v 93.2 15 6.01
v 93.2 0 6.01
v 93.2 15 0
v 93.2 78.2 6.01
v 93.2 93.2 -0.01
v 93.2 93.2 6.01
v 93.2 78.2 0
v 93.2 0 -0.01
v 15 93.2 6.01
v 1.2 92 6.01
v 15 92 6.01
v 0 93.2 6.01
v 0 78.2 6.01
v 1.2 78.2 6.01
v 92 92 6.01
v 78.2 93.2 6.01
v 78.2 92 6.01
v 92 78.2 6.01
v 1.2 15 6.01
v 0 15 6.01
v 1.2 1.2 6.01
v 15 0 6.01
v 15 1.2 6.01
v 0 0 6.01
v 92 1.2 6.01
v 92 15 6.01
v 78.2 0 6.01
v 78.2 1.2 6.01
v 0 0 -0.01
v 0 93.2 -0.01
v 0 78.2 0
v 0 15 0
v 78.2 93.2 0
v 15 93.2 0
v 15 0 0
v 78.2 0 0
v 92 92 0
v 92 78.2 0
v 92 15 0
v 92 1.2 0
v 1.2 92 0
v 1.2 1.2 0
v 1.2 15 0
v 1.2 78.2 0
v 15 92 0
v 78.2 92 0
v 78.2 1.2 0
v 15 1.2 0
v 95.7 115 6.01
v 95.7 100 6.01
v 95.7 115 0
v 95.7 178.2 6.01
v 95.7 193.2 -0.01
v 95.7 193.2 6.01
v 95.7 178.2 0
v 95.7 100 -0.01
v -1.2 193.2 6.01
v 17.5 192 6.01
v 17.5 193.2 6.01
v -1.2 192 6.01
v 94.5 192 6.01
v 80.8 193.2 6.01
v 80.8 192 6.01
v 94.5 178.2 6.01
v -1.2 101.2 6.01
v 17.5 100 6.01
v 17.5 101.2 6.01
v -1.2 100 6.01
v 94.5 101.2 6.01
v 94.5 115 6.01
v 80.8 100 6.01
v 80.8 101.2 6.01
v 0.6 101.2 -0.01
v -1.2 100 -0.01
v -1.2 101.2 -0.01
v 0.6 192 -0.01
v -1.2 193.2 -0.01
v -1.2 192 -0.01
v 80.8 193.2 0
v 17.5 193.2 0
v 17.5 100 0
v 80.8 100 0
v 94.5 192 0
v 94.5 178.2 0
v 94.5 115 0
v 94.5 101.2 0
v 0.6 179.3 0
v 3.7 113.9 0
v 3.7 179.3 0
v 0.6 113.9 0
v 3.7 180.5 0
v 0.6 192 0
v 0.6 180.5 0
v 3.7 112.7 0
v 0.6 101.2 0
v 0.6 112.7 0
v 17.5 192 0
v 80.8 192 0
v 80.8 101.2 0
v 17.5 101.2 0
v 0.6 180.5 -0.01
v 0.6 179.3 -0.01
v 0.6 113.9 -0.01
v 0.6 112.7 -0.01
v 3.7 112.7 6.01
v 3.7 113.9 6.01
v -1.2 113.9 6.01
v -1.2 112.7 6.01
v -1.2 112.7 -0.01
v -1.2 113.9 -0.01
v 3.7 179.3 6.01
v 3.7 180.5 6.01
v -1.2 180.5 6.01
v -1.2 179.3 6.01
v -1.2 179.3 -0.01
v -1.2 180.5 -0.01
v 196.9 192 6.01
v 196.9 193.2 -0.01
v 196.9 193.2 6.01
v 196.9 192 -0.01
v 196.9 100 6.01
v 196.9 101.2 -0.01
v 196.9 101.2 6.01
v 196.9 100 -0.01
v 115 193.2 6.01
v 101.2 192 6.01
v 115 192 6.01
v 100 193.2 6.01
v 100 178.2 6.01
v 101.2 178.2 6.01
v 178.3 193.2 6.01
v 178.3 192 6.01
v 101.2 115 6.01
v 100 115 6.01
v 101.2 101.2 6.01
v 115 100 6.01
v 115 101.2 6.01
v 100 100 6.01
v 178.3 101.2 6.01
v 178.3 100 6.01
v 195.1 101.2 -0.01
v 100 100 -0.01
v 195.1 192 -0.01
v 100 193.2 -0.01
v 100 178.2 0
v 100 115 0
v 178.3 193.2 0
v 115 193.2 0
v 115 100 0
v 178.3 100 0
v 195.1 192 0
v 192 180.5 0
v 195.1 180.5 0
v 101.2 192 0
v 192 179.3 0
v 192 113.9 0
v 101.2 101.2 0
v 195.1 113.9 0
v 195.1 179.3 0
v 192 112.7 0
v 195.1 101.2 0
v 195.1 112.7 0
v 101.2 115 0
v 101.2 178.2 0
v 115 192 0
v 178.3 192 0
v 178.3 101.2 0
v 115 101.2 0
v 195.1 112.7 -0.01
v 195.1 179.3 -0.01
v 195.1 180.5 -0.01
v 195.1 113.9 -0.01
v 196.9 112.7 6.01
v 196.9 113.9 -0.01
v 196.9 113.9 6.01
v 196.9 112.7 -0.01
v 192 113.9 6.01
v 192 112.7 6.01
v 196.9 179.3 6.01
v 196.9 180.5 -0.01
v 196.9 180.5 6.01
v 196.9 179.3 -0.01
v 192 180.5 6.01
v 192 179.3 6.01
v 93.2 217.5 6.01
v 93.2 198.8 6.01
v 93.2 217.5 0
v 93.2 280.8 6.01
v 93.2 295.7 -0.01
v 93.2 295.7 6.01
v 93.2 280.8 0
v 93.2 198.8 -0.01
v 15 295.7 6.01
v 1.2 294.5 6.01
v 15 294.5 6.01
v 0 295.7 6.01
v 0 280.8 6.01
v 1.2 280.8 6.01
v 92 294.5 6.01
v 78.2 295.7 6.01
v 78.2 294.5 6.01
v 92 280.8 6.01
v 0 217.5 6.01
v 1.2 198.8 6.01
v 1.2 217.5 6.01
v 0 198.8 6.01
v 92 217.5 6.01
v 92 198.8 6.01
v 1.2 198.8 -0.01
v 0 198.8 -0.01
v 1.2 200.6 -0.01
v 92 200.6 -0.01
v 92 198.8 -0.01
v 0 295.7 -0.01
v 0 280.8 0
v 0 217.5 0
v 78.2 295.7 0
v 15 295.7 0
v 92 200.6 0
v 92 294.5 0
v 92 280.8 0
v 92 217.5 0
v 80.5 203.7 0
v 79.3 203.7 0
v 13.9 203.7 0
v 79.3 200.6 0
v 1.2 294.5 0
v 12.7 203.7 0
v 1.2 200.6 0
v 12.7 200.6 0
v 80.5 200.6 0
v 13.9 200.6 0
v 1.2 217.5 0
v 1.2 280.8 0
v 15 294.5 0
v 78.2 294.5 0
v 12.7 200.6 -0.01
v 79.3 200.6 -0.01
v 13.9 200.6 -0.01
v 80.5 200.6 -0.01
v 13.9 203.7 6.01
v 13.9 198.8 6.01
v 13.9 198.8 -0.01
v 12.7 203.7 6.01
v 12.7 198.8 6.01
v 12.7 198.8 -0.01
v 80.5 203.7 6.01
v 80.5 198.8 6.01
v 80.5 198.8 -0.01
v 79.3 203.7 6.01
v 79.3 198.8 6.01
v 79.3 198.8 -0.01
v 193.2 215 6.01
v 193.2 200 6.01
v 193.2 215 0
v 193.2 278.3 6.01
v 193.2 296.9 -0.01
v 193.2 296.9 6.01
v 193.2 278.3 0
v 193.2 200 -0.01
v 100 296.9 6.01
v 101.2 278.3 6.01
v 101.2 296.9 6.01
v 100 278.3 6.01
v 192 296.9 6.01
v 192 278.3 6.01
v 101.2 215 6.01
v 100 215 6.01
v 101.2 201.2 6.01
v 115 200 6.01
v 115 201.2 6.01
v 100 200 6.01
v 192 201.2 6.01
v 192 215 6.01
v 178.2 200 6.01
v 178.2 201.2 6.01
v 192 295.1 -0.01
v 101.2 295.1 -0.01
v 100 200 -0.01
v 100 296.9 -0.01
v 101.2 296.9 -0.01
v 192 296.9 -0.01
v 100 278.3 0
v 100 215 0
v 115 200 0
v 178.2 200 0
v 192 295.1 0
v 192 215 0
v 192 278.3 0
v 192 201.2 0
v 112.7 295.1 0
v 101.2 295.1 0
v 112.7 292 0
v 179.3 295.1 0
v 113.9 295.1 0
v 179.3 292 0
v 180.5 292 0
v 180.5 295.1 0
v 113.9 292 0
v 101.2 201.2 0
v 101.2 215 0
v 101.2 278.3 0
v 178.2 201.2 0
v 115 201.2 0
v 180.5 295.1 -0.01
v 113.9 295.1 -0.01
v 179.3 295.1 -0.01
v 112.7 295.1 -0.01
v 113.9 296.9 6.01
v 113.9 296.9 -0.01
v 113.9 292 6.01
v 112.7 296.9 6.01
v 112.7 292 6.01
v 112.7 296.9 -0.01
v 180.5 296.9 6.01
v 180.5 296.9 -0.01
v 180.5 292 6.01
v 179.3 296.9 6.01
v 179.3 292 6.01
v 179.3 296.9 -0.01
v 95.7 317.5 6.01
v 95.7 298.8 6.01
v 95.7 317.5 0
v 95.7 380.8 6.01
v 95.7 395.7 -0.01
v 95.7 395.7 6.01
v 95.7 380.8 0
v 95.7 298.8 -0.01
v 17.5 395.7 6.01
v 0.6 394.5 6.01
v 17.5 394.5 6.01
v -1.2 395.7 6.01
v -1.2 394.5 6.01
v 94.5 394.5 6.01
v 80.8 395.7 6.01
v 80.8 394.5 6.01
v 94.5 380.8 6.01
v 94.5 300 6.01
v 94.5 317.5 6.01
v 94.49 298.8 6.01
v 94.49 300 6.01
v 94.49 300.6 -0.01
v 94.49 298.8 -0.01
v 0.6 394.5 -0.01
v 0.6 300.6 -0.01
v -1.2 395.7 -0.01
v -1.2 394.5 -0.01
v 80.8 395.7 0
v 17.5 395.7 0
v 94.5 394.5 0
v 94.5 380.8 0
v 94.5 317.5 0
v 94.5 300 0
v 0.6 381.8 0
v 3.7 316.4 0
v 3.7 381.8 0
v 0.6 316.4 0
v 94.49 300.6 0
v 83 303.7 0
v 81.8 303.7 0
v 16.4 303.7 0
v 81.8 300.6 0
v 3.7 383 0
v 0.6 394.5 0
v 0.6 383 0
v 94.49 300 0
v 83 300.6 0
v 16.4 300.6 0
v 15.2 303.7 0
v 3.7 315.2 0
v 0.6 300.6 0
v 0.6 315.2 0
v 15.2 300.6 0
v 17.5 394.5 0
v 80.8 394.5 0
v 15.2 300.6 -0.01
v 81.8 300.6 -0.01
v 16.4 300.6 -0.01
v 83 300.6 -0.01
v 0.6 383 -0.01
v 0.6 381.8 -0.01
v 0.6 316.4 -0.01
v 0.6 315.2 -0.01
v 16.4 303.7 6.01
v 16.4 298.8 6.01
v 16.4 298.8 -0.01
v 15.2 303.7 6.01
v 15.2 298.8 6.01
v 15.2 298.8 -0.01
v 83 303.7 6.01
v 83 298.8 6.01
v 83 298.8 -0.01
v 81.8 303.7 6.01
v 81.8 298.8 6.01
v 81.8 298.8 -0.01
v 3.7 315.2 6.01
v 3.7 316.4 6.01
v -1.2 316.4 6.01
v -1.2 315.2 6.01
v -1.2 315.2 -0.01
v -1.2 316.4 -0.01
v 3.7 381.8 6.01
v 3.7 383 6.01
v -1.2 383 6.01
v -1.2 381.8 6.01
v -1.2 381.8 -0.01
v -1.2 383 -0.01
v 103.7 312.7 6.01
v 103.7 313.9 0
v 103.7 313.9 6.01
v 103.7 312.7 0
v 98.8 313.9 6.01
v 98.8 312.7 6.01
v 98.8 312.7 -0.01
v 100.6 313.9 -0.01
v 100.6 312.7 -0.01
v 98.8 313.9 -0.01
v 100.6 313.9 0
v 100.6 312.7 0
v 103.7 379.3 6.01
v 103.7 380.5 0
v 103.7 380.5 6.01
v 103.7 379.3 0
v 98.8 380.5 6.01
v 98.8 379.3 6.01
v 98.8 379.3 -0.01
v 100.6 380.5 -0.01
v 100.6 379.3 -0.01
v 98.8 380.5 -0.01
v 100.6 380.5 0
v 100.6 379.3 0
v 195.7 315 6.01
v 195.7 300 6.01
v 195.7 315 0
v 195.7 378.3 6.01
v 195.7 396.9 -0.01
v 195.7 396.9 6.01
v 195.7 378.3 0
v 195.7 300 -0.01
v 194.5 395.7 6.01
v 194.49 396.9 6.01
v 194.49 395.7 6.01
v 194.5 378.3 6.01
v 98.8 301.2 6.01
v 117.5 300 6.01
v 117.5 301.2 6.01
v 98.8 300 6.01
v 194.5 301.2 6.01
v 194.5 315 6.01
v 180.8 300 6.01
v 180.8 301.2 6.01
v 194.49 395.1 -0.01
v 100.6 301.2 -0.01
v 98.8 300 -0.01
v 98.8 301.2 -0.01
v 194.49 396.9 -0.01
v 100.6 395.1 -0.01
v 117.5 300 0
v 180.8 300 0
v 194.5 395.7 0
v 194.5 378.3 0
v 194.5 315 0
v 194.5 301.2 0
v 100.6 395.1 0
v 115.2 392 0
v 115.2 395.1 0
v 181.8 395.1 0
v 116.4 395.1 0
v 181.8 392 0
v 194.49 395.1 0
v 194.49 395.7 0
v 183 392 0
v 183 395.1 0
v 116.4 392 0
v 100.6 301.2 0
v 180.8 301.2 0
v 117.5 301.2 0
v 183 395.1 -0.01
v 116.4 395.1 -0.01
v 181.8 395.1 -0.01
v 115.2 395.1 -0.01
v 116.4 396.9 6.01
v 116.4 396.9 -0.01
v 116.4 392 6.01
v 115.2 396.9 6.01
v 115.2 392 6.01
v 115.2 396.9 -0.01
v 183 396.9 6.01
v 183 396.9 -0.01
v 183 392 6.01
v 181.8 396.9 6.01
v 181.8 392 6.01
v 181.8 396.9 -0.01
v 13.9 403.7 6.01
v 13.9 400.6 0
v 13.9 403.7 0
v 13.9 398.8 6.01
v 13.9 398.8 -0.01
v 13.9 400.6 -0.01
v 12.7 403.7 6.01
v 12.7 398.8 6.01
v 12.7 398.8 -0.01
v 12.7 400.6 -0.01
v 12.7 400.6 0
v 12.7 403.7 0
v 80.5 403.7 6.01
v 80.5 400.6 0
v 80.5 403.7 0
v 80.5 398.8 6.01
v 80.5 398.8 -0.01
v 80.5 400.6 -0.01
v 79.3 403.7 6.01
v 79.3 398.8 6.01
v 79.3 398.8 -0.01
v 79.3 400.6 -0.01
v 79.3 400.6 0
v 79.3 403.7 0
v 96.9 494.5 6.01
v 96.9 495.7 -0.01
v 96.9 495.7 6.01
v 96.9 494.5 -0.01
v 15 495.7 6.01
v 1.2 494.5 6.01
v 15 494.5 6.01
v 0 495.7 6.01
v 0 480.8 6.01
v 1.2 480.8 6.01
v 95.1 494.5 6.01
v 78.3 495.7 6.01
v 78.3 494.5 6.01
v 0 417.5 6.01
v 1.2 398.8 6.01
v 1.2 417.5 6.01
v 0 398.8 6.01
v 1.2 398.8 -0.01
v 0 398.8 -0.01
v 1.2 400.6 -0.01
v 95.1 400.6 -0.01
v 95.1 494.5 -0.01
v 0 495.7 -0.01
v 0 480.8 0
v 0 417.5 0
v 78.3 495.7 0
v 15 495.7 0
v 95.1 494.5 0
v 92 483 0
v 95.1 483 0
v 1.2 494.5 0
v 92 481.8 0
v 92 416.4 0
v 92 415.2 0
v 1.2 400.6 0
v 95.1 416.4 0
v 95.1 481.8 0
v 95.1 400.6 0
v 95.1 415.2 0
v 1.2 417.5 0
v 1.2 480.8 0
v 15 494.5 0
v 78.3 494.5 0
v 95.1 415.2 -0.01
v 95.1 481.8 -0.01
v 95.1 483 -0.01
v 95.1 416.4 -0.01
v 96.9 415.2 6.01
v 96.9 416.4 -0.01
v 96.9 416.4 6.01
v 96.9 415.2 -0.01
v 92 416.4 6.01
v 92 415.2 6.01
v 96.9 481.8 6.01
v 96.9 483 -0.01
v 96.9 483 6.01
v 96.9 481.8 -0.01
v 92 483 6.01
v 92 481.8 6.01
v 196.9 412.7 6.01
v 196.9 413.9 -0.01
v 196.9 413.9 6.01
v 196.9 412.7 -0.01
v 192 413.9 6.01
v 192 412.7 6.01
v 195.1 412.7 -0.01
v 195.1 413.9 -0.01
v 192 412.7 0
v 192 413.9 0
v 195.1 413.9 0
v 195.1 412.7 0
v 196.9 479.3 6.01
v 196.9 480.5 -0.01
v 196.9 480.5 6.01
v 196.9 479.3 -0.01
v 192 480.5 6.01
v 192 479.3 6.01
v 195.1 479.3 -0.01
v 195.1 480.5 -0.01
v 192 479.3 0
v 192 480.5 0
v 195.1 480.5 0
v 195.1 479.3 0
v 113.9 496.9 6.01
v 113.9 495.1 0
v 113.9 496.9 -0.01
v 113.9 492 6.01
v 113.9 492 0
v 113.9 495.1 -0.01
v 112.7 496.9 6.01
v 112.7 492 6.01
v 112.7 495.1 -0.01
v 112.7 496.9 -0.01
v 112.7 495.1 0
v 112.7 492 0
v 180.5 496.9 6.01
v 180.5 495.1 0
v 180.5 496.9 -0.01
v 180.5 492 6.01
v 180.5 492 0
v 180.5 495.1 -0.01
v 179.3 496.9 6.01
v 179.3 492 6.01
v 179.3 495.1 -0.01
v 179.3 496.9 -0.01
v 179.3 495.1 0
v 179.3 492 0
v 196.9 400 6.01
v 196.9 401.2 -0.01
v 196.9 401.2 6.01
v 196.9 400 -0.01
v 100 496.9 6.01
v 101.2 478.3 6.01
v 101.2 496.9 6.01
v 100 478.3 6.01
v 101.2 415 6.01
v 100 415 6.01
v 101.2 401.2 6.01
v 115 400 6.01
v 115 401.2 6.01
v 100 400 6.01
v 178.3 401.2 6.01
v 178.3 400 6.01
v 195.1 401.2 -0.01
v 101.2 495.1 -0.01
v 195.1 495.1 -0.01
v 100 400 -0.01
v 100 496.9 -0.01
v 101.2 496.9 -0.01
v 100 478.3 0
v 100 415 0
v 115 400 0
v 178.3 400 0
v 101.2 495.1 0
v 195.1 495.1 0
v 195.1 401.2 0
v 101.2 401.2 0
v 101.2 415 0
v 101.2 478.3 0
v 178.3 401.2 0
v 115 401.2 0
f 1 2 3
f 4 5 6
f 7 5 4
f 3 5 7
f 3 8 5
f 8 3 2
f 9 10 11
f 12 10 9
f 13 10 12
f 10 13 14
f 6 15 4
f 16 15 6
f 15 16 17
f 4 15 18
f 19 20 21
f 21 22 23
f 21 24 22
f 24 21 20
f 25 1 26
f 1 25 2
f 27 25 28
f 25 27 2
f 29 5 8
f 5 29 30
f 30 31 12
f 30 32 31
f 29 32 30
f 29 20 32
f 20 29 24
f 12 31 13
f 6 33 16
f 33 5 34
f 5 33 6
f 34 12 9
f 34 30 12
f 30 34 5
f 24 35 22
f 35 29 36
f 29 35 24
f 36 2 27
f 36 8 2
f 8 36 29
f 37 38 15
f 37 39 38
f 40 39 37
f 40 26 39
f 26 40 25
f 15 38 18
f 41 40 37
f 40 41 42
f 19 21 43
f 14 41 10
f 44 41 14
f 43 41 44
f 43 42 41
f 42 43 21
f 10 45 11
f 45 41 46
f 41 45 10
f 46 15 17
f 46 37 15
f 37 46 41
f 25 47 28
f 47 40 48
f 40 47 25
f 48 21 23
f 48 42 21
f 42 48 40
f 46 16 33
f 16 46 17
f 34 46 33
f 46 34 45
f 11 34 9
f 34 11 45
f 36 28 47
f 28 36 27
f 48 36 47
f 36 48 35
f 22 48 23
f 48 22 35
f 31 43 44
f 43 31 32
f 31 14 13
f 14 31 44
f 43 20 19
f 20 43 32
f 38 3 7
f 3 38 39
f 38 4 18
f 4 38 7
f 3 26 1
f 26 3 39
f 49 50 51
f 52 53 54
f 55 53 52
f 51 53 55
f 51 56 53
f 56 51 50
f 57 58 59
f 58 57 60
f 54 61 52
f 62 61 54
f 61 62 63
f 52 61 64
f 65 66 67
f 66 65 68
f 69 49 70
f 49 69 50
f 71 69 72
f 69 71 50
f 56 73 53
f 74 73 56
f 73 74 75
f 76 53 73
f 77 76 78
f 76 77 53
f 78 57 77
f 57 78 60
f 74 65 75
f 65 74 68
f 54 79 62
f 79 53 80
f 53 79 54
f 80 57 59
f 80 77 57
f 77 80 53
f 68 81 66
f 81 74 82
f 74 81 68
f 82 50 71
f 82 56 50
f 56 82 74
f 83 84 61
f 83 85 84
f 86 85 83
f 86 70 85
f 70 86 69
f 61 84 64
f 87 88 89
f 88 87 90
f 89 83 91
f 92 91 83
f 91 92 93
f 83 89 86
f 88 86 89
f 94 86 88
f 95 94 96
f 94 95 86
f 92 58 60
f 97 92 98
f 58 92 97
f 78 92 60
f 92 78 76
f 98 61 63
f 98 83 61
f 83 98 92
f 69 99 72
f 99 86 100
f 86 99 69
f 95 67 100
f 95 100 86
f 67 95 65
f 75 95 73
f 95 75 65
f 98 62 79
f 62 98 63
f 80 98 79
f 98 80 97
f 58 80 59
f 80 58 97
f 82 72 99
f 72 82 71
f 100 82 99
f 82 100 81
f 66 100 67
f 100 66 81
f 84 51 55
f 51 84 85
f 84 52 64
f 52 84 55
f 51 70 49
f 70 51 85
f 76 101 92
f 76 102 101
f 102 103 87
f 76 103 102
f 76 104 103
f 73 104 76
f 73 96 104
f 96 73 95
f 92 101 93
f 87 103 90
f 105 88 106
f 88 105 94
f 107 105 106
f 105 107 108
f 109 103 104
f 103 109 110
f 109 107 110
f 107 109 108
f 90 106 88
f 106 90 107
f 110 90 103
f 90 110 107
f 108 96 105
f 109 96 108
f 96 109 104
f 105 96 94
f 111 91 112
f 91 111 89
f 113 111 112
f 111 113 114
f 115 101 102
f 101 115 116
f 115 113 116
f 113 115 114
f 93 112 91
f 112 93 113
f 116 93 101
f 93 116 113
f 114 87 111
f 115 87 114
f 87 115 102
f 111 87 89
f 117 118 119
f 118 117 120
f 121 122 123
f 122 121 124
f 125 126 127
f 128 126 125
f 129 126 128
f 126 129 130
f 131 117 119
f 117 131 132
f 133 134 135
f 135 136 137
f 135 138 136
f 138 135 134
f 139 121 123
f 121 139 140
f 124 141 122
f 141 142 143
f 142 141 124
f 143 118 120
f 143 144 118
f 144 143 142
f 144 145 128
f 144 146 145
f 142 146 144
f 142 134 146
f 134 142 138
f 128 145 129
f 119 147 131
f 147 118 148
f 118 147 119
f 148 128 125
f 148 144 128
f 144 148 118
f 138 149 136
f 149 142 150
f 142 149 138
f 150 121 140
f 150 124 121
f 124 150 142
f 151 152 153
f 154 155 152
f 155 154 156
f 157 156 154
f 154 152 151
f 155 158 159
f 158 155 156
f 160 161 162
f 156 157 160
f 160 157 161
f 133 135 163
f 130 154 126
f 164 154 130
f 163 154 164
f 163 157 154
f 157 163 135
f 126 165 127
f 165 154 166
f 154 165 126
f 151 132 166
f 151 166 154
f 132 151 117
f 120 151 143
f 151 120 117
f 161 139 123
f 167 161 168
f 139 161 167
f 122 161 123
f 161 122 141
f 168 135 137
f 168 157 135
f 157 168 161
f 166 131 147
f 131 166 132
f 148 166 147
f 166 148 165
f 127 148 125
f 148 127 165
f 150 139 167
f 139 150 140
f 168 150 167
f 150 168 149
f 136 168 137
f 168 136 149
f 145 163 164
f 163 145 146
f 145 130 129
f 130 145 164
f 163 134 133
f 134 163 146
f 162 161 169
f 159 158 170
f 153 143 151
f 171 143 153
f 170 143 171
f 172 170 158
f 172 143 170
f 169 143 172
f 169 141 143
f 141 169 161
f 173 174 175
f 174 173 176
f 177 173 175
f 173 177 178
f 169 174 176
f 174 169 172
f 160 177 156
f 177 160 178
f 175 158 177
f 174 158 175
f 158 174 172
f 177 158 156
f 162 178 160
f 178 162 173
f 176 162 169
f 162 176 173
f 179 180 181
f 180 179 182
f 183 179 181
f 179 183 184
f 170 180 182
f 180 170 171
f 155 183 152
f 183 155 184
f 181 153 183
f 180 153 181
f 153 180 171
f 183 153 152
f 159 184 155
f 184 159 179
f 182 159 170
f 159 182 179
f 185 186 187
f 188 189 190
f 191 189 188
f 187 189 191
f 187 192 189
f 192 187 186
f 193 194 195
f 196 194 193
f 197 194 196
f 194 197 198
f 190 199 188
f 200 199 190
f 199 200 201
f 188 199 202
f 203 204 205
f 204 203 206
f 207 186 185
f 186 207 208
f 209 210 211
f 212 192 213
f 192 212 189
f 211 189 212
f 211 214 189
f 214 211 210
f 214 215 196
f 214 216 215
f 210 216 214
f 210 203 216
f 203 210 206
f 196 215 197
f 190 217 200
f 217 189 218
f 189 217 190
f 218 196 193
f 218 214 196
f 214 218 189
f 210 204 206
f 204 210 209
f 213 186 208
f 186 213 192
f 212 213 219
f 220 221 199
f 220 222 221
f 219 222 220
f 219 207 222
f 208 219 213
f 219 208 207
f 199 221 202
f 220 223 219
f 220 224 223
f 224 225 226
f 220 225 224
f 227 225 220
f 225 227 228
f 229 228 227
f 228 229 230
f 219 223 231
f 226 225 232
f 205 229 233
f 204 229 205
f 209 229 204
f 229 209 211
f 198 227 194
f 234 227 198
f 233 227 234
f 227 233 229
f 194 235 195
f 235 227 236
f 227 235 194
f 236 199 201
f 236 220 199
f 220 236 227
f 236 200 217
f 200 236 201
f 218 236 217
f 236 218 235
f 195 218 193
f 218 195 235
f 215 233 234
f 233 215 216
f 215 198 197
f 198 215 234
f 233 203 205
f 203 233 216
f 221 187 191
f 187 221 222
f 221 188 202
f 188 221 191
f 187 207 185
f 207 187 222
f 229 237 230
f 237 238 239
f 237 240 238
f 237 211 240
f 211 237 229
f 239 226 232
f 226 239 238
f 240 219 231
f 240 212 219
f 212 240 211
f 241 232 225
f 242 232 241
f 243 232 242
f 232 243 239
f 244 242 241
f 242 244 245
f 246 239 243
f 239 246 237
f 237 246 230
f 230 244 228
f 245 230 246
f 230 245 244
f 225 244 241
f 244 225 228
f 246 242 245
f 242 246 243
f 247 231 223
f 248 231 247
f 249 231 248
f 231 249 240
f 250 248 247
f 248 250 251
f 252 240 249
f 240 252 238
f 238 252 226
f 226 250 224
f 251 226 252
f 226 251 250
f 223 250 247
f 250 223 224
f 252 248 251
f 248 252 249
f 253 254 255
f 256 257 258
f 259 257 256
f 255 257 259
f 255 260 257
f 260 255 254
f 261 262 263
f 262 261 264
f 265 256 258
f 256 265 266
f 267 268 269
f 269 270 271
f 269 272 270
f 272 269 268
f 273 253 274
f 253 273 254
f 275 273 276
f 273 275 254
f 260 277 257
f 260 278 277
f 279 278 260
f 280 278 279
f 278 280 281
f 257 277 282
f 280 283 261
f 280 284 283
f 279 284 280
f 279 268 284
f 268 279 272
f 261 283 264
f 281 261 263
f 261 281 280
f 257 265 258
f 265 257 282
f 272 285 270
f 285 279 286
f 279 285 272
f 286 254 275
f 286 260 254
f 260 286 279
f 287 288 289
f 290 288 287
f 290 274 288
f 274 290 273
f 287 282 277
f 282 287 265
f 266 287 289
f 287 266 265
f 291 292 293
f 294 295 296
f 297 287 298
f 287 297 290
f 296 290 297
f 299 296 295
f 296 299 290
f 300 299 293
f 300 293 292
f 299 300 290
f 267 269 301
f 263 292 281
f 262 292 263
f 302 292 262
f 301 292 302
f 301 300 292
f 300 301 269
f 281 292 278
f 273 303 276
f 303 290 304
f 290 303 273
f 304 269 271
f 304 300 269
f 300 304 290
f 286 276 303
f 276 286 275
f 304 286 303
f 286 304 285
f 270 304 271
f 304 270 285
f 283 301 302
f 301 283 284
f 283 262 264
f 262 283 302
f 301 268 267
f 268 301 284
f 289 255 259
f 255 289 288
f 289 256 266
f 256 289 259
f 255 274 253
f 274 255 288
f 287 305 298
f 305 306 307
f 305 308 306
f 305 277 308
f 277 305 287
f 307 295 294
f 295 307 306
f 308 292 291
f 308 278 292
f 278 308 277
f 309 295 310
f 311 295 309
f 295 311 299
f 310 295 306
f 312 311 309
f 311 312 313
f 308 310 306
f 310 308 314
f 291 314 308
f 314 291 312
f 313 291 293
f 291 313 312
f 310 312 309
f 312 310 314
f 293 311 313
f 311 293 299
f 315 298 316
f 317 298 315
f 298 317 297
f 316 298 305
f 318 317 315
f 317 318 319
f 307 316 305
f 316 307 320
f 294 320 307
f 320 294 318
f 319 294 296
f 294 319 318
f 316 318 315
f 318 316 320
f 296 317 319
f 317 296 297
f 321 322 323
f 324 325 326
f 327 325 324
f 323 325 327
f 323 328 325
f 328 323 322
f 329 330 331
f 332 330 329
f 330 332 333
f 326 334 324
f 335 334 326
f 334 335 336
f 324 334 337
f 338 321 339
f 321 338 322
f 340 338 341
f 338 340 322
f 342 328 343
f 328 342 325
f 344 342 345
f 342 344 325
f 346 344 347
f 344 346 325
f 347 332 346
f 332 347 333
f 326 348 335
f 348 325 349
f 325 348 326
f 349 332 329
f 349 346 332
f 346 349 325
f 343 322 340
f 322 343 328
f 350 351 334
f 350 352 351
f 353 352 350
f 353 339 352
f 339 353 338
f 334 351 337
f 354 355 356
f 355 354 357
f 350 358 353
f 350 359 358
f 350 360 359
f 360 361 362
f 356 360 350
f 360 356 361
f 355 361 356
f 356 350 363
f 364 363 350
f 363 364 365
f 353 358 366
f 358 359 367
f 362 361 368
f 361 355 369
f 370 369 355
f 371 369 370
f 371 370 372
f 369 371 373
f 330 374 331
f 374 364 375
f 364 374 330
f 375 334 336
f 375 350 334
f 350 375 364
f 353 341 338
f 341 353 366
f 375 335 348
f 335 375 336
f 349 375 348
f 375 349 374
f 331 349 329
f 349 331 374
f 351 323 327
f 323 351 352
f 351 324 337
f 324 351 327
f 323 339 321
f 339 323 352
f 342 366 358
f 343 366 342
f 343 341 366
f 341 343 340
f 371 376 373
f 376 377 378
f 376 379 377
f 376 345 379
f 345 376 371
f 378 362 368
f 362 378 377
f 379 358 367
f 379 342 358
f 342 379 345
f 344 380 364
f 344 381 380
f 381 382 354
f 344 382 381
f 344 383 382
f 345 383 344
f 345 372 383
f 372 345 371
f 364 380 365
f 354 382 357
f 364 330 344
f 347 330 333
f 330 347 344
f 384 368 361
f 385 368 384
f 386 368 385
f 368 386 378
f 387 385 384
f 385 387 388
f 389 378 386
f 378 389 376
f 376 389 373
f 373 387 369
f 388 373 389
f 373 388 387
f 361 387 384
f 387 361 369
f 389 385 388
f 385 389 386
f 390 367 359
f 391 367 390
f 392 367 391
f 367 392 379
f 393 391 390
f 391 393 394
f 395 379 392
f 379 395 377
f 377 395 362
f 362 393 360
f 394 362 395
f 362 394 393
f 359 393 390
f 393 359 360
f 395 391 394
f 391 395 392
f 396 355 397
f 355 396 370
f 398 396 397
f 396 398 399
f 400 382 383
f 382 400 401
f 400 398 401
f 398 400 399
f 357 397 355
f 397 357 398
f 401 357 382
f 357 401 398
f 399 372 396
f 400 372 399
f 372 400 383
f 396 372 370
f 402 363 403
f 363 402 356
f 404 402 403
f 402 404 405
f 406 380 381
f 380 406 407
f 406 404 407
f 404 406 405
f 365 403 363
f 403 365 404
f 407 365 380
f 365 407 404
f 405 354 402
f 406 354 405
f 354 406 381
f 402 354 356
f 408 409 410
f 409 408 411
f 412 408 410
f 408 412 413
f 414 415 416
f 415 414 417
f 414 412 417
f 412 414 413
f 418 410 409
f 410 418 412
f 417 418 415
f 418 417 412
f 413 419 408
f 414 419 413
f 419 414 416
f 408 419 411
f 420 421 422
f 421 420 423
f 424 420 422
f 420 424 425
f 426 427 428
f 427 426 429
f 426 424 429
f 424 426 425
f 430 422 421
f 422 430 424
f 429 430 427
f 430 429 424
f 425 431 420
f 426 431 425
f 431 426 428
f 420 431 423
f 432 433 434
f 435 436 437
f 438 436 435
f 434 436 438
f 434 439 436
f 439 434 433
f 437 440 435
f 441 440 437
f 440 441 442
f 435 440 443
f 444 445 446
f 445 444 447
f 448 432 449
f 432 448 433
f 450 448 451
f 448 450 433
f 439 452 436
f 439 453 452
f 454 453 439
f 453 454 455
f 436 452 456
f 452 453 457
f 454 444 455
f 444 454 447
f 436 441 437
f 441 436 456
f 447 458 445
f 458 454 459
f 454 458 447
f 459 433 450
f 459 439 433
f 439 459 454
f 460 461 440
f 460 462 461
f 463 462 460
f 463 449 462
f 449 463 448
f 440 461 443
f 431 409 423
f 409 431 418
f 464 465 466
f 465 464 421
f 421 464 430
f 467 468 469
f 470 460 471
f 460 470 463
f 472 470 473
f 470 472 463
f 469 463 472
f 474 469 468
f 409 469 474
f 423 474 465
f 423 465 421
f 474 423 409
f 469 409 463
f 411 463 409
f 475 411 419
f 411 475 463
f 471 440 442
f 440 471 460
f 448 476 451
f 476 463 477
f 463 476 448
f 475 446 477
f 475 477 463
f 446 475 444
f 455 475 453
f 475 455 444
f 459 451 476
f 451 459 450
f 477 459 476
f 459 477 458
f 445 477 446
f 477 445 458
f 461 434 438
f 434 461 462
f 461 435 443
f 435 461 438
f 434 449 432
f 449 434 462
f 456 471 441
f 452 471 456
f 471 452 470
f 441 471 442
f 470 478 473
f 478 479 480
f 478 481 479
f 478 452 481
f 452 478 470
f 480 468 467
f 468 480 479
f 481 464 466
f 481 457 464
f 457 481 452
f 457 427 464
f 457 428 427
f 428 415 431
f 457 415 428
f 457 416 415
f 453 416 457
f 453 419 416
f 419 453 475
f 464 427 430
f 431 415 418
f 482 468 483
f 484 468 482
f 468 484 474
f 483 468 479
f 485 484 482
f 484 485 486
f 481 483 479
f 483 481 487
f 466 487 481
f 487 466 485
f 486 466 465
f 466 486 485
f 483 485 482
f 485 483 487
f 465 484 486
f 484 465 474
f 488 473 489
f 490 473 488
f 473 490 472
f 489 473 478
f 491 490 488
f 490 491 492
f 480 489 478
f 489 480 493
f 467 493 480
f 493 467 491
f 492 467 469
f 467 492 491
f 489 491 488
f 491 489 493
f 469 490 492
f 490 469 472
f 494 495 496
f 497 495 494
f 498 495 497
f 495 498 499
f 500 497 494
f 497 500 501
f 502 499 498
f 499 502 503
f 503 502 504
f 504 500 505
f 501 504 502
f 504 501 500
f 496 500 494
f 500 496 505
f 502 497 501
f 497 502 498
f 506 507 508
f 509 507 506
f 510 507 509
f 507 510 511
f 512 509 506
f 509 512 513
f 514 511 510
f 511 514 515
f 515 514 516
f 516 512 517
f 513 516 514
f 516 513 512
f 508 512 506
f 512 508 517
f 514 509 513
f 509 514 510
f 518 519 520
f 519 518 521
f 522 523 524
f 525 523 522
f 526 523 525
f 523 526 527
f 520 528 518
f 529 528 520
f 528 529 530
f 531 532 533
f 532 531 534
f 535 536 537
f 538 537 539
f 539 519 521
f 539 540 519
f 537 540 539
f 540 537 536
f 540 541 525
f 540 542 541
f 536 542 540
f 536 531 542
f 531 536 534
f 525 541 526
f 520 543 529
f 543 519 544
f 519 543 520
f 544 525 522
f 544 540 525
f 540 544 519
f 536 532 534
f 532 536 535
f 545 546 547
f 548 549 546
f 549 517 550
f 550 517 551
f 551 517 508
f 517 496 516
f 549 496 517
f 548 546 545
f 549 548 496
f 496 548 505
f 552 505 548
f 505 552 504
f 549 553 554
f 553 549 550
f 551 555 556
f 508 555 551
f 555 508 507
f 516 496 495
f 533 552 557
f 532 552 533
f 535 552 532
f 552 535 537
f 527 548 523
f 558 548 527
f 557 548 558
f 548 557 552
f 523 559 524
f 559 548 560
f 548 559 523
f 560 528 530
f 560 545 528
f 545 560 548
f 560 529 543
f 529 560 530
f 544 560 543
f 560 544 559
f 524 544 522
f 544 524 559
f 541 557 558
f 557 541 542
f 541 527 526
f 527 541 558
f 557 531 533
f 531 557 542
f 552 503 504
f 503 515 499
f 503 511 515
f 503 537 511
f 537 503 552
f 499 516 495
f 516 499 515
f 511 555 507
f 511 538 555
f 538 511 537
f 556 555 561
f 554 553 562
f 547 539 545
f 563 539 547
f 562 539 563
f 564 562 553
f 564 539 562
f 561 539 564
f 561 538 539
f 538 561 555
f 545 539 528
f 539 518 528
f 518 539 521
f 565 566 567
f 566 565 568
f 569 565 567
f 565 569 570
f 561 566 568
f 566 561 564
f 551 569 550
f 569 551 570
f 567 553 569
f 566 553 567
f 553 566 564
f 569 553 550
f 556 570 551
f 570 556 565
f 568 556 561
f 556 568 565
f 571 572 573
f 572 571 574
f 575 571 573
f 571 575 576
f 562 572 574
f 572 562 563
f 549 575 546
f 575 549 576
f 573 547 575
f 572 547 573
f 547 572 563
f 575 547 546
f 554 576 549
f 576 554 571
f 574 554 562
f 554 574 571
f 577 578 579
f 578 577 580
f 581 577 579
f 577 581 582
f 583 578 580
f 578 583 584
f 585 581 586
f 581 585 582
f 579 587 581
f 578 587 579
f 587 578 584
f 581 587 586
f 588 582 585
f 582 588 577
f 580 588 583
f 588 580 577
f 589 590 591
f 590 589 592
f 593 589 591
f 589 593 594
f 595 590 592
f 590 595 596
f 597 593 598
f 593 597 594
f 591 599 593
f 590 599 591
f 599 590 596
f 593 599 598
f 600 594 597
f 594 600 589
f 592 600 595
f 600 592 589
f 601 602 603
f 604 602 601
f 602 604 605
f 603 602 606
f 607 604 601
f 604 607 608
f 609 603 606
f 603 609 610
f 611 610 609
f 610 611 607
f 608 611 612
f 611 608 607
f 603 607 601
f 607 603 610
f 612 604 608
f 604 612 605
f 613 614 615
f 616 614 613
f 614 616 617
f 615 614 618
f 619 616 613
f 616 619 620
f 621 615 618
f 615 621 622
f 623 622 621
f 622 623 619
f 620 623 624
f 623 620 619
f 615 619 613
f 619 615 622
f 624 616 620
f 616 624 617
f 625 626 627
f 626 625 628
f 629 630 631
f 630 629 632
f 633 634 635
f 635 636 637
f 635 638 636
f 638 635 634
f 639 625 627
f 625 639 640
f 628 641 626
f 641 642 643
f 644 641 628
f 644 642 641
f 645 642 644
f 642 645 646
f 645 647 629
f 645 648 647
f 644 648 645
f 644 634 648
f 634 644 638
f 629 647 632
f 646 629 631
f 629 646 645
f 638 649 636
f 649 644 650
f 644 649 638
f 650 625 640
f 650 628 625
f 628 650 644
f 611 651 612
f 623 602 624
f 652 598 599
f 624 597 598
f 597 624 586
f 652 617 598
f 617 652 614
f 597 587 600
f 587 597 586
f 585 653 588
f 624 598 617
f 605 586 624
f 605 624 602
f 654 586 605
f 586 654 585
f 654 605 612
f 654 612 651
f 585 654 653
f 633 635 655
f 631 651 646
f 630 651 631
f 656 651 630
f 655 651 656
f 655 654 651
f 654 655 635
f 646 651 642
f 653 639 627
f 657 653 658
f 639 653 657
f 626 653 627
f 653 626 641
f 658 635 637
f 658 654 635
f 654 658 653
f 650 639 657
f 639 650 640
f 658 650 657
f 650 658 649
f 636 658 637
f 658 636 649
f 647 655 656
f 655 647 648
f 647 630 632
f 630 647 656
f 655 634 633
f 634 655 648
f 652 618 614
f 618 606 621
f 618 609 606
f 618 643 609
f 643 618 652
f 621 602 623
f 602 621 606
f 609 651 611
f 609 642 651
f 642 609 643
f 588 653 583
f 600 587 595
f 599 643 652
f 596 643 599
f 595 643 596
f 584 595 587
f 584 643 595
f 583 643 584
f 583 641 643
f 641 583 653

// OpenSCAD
// file: ../../Base/Boxes.scad
// Fischertechnik Box Foundation
// Pre-designed Boxes

use <Constants.scad>

include <PlacementOptions.scad>

box190Width = 190;
box190Depth = 130;
box130Width = 130;
box130Depth = 95;

// Values are from an original ec3 box
topBottomDifference = 1.5;
outerHeight = 40;
innerHeight = 38.2;
baseThickness = outerHeight - innerHeight;
stackExcess = 5.7;
radius = 3.5;
wallThickness = 1.5;
tolerance = 0.2;
stackOffset = innerHeight - stackExcess;

boxUsageHeight = stackOffset;
boxWallThickness = wallThickness;
boxBaseThickness = baseThickness;
boxWebWidth = 3.0;

// getBoxWallThickness()
// Gets the wall thickness of a Fischertechnik Box
function getBoxWallThickness() = boxWallThickness;

// getBoxUsageHeight()
// Gets the usable height of a Fischertechnik box
function getBoxUsageHeight() = boxUsageHeight;

// getBoxInnerHeight()
// Gets the inner height of a Fischertechnik box, including the stack excess
function getBoxInnerHeight() = innerHeight;

// getBoxBaseThickness()
// Gets the thickness of the Fischertechnik box base.
function getBoxBaseThickness() = boxBaseThickness;

// getBoxWebWidth()
// Gets the width of a box web
function getBoxWebWidth() = boxWebWidth;

// getBox190Space()
// Gets the usable inner space of a Box 190 as an x/y-list
function getBox190Space() = [
    box190Width - 2*getBoxWallThickness() - topBottomDifference, 
    box190Depth - 2*getBoxWallThickness() - topBottomDifference ];

// BoxBase(width, depth)
// Creates an empty stackable Fischertechnik compatible box
// width = Outer width of the box (190, 130, ...)
// depth = Outer depth of the box (130, 95, ...)

module BoxBase(width, depth, height=outerHeight) {    
    thinPlate = 0.01;

    innerHeight = height - baseThickness;    
    
    module BodyPlate(width, depth) {
        translate([radius, radius])
        hull() {
            w = width-2*radius;
            d = depth-2*radius;
            cube([w, d, thinPlate]);
            cylinder(thinPlate, r=radius, $fn=getFragments());
            translate([w, 0])
                cylinder(thinPlate, r=radius, $fn=getFragments());
            translate([w, d])
                cylinder(thinPlate, r=radius, $fn=getFragments());
            translate([0, d])
                cylinder(thinPlate, r=radius, $fn=getFragments());
        }
    }
    
    module Body(tolerance=tolerance) {
        hull() {
            // Bottom with tolerance to fit into the original boxes when stacked
            translate([-wallThickness+tolerance, -wallThickness+tolerance, -baseThickness])
                BodyPlate(width-topBottomDifference-2*tolerance, depth-topBottomDifference-2*tolerance);
            
            // Top
            translate([-wallThickness-topBottomDifference/2, -wallThickness-topBottomDifference/2, innerHeight-thinPlate])
                BodyPlate(width, depth);
         }
    }

    module Cutoff() {
        hull() {
            coWidth = width - 2*wallThickness;
            coDepth = depth - 2*wallThickness;
            
            // Bottom
            BodyPlate(coWidth-topBottomDifference, coDepth-topBottomDifference);

            // Top
            translate([-topBottomDifference/2, -topBottomDifference/2, innerHeight+thinPlate]) 
                BodyPlate(coWidth, coDepth);
        }
    }
    
    difference() {        
        Body();
        Cutoff();
        stackOffset = innerHeight - stackExcess;
        translate([0, 0, stackOffset + baseThickness])
            Body(tolerance=0);
    }
}

// Creates the Fischertechnik empty box 130x190 mm and places it at position 0,0
// 190x130 are the outer sizes, the inner space is slightly smaller. Use getBox190Space() to get the inner sizes.
// The box is positioned that the usable inner space is at the 0,0,0 position. The

module Box190() {
    BoxBase(box190Width, box190Depth);
}

// Gets the usable inner space of a Box 130 as an x/y-list
function getBox130Space() = [
    box130Width - 2*getBoxWallThickness() - topBottomDifference, 
    box130Depth - 2*getBoxWallThickness() - topBottomDifference ];

// Creates the Fischertechnik empty box 95x130 mm and places it at position 0,0
// 190x130 are the outer sizes, the inner space is slightly smaller. Use getBox190Space() to get the inner sizes.
// The box is positioned that the usable inner space is at the 0,0,0 position. The

module Box130() {
    BoxBase(box130Width, box130Depth);
}

// Creates a web at the specified box walls
// corner 0 = LowerLeft, 1 = UpperLeft, 2 = UpperRight, 3 = LowerRight
// side 0 = LeftOfCorner, 1 = RightOfCorner
// distance = Distance in mm from the corner
// boxSpace = inner width and depth of the box (default: Box 190)
// webWidth = length of the web (default is 3 mms)
// webThickness = thickness of the web (default is 1 mm)

module BoxWeb(corner, side, distance, boxSpace=getBox190Space(), webWidth=getBoxWebWidth(), webThickness=1.0) {
    sink = getBoxWallThickness()/2;

    width = (corner % 2 == 0) ? 
            (side == LeftOfCorner ? webWidth : webThickness) :
            (side == LeftOfCorner ? webThickness : webWidth);

    depth = (corner % 2 == 0) ? 
            (side == RightOfCorner ? webWidth : webThickness) :
            (side == RightOfCorner ? webThickness : webWidth);
    
    xDiff = corner == LowerLeft ? 
                (side == LeftOfCorner ? -sink : distance) :
            (corner == UpperLeft ?                
                (side == LeftOfCorner ? distance : -sink) :
            (corner == UpperRight ?
                (side == LeftOfCorner ? boxSpace.x-webWidth+sink : boxSpace.x-distance-webThickness) :
                (side == LeftOfCorner ? boxSpace.x-distance-webThickness: boxSpace.x-webWidth+sink)));

    yDiff = corner == LowerLeft ? 
                (side == RightOfCorner ? -sink : distance) :
            (corner == UpperLeft ?
                (side == RightOfCorner ? boxSpace.y-distance : boxSpace.y-webWidth+sink) :
            (corner == UpperRight ?
                (side == RightOfCorner ? boxSpace.y-webWidth+sink : boxSpace.y-distance) :
                (side == RightOfCorner ? distance : -sink)));
    
    translate([xDiff, yDiff, -getExcess()])
        cube([width, depth, boxUsageHeight + 2*getExcess()]);
}
// file: ../../Base/Rotation.scad
// Fischertechnik Box Foundation
// Geometry Helpers Rotation

include <PlacementOptions.scad>

// getRotatedSpace(space, rotation=NoRotation)
// Rotates the space dependent on the specified rotation

function getRotatedSpace(space, rotation=NoRotation) = [
    (rotation == Rotate90 || rotation == Rotate270) ? space.y : space.x,
    (rotation == Rotate90 || rotation == Rotate270) ? space.x : space.y
];

// Rotates the given space around the fixed left lower corner
// space = the space the children needs as width/depth list [width,depth]
// rotation = 0 Rotate0 degrees, 1 Rotate90 degrees, 2 Rotate180 degrees, 3 Rotate270 degrees (equivalent to -90)

module RotateFix(space, rotation=NoRotation) {
    dy = (rotation == Rotate0 || rotation == Rotate270) ? 0 :
        (rotation == Rotate90) ? space.x :
        space.y;
    dx = (rotation < Rotate180) ? 0 :
        (rotation == Rotate180) ? space.x :
        space.y;
    
    translate([dx, dy, 0])
        rotate([0, 0, rotations[rotation]])
            children();
}
// file: ../../Base/Alignment.scad
// Fischertechnik Box Foundation
// Geometry Helpers Alignment

include <PlacementOptions.scad>

// getAlignedX(elementWidth, spaceWidth, align=AlignRight, offset=0)
// Gets the aligned X offset of an element with the given
// width in the given space.
// elementWidth = The width of the element to positon
// spaceWidth = The space where the element should be aligned
// align = 0 AlignLeft, 1 AlignCenter, 2 AlignRight
// offset = an optional offset from the aligned position. When
// aligned left or centered, then positive values are in X direction.
// When aligned right then positive values are in negative X direction.

function getAlignedX(elementWidth, spaceWidth, align=AlignRight, offset=0) =
    (align == AlignLeft) ?
        offset :
        ((align == AlignCenter) ?
        (spaceWidth - elementWidth)/2 + offset :
        spaceWidth - offset - elementWidth);

// getAlignedY(elementDepth, spaceDepth, align=AlignTop, offset=0)
// Gets the aligned Y offset of an element with the given
// depth in the given space.
// elementDepth = The depth of the element to positon
// spaceDepth = The space where the element should be aligned
// align = 0 AlignBottom, 1 AlignCenter, 2 AlignTop
// offset = an optional offset from the aligned position. When
// aligned bottom or centered, then positive values are in Y direction.
// When aligned top then positive values are in negative Y direction.

function getAlignedY(elementDepth, spaceDepth, align=AlignTop, offset=0) =
    (align == AlignBottom) ?
        offset :
        ((align == AlignCenter) ?
        (spaceDepth - elementDepth)/2 + offset :
        spaceDepth - offset - elementDepth);
// file: ../../Base/Constants.scad
// Fischertechnik Box Foundation
// Constants

// Constant values necessary for multiple elements

// Base constants
dividerThickness = 1.2;
excess = 0.01;
fragments = 90;
tolerance = 0.8;

// Gets the thickness of a divider 
function getDividerThickness() = dividerThickness;

// Gets the excess that is used to merge walls into each other
function getExcess() = excess;

// Gets amount of fragments of a cylinder
function getFragments() = fragments;

// Gets the inner tolerance of a frame to each side
function getTolerance() = tolerance;


// Fischertechnik specific constants
axisDiameter = 4;
axisBottomDiameter = axisDiameter + 1;
standardEdgeDistance = 2.5;
standardWebDistance = 11.5;
standardCornerLength = 15;
tubeWallFactor = 0.8;
smallPartsFrameHeight = 20;

// Gets axis diameter
function getAxisDiameter() = axisDiameter;

// Gets axis bottom diameter for thicker part at the bottom
function getAxisBottomDiameter() = axisBottomDiameter;

// gets the standard distance to the wall of the box for dockable frames with webs
function getStandardEdgeDistance() = standardEdgeDistance;

// gets the standard distance of each web to the corner of the dockable frame
function getStandardWebDistance() = standardWebDistance;

// gets the standard length of the corner walls of a dockable frame
function getStandardCornerLength() = standardCornerLength;

// gets the wall thickness of a tube.
function getTubeWallThickness() = tubeWallFactor * getDividerThickness();

// gets the frame height for docked small parts boxes.
function getSmallPartsFrameHeight() = smallPartsFrameHeight;
// file: ../../Base/PlacementOptions.scad
// Fischertechnik Box Foundation
// Placement Options

// Alignment
NoAlign = 0;
AlignLeft = 1;
AlignBottom = 2;
AlignCenter = 3;
AlignRight = 4;
AlignTop = 5;

// Element rotation degree steps
rotations = [0, -90, -180, -270];

// Rotation
NoRotation = 0;
Rotate0 = 0;
Rotate90 = 1;
Rotate180 = 2;
Rotate270 = 3;

// Docking (seen from above)
NoDock = -1;
DockLeft = 0;
DockTop = 1;
DockRight = 2;
DockCorner = 2;
DockBottom = 3;

// Web corners
LowerLeft = 0;
UpperLeft = 1;
UpperRight = 2;
LowerRight = 3;

// Web position relative to corner
LeftOfCorner = 0;
RightOfCorner = 1;
// file: ../../Elements/FrameTXTController.scad
// Fischertechnik Box Library
// Frame for TX/TXT controller
// 153513, 173067, 500995, 

use <../Base/Constants.scad>
use <../ModelBase/Simple.scad>
use <../ModelBase/Complex.scad>

include <../Base/PlacementOptions.scad>

width = 90;
depth = 90;
height = 6;

// getFrameTXTControllerSpace(alignX, alignY)
// alignX 0=NoAlign 1=AlignLeft 3=AlignCenter 4=AlignRight 
// alignY 0=AlignNo 2=AlignBottom 3=AlignCenter 5=AlignTop
// Gets the space the frame for a TXT Controller needs as width and depth(.x and .y as a list). 

function getFrameTXTControllerSpace(alignX=NoAlign, alignY=NoAlign) = 
    getDockableEdgedFrameSpace([width, depth, height], alignX, alignY);

// FrameTXTController(alignX, alignY)
// Frame for TXT controller.
// alignX 0=NoAlign 1=AlignLeft 3=AlignCenter 4=AlignRight 
// alignY 0=AlignNo 2=AlignBottom 3=AlignCenter 5=AlignTop

module FrameTXTController(alignX=NoAlign, alignY=NoAlign) {
    DockableEdgedFrame([width, depth, height], alignX, alignY);
}

// Test
color("lightgray") {
    FrameTXTController();
}
// file: ../../Base/Placement.scad
// Fischertechnik Box Foundation
// Geometry Helpers Placement

use <Constants.scad>
use <Alignment.scad>
use <Rotation.scad>
use <Boxes.scad>

include <PlacementOptions.scad>

// Place(x=0, y=0, elementSpace=[0,0], alignX=AlignLeft, alignY=AlignBottom, rotation=Rotate0, boxSpace=getBox190Space())
// Places the child at the specified position
// y = Y-Position. This is a relative position when an X aligment is specified.
// x = X-Position. This is a relative position when an Y aligment is specified.
// elementSpace = space of the element to be placed [x,y]
// alignX = -1=NoAlign, 0 AlignLeft, 1 AlignCenter, 3 AlignRight (elementSpace and boxSpace required!)
// alignY = -1=NoAlign, 2 AlignBottom, 1 AlignCenter, 4 AlignTop (elementSpace and boxSpace required!)
// rotation = 0 Rotate0 0 degrees, 1 Rotate90 90 degrees, 
// 2 Rotate180 180 degrees, 3 Rotate270 270 degrees (equivalent to -90)
// boxSpace = Inner space of the box where the placement occurs [x,y] - default is Box 190x130 inner space

module Place(x=0, y=0, elementSpace=[0,0], 
  alignX=AlignLeft, alignY=AlignBottom, 
  rotation=NoRotation, boxSpace=getBox190Space()) {

    module Position(x, y, space, rotation=Rotate0) {
        translate([x, y, 0])
            RotateFix(space, rotation)
                children();
    }

    space = getRotatedSpace(elementSpace, rotation);
    alignedX = getAlignedX(space.x, boxSpace.x, alignX, x);
    alignedY = getAlignedY(space.y, boxSpace.y, alignY, y);
    Position(alignedX, alignedY, elementSpace, rotation)
        children();
}

// Center(space=getBox130Space(), elementSpace=[0,0])
// space = Space where the children is centered. For cylinder use centered=true and no elementSpace.
// elementSpace = space of the element to be centered [x,y]

module Center(space=getBox190Space(), elementSpace=[0,0]) {
    Place(elementSpace=elementSpace, boxSpace=space, alignX=AlignCenter, alignY=AlignCenter)
        children();
}

// CenterHorizontal(width=0, y=0, offset=0, space=getBox130Space())
// width = Width of the element to be placed.
// y = Y position of the element
// offset = Offset from the center position (negative will be left of the center)
// space = Space where the element is placed

module CenterHorizontal(width=0, y=0, offset=0, space=getBox190Space()) {
    Place(x=offset, y=y, elementSpace=[width, 0], boxSpace=space, alignX=AlignCenter)
        children(0);
}

// CenterVertical(depth=0, x=0, offset=0, space=getBox130Space())
// depth = Depth of the element to be placed.
// x = X position of the element
// offset = Offset from the center position (negative will be down of the center)
// space = Space where the element is placed

module CenterVertical(depth=0, x=0, offset=0, space=getBox190Space()) {
    Place(x=x, y=offset, elementSpace=[0, depth], boxSpace=space, alignY=AlignCenter)
        children(0);
}

// getIsVertical(align)
// True if the specified alignment needs a vertical orientation for a divider (AlignRight, AlignLeft)

function getIsVertical(align) = (align == AlignRight || align == AlignLeft);

// getIsHorizontal(align)
// True if the specified alignment needs a horizontal orientation for a divider (AlignTop, AlignBottom)

function getIsHorizontal(align) = (align == AlignTop || align == AlignBottom);
// main file
// Fischertechnik Box Foundation
// Elements
// Test FrameTXTController

use <../../Base/Placement.scad>
use <../../Elements/FrameTXTController.scad>

include <../../Base/PlacementOptions.scad>

FrameTXTController();

Place(0, 100)
    FrameTXTController(alignX=AlignLeft);

Place(100, 100)
    FrameTXTController(alignX=AlignRight);

Place(0, 200)
    FrameTXTController(alignY=AlignBottom);

Place(100, 200)
    FrameTXTController(alignY=AlignTop);

Place(0, 300)
    FrameTXTController(alignX=AlignLeft, alignY=AlignBottom);

Place(100, 300)
    FrameTXTController(alignX=AlignLeft, alignY=AlignTop);

Place(0, 400)
    FrameTXTController(alignX=AlignRight, alignY=AlignBottom);

Place(100, 400)
    FrameTXTController(alignX=AlignRight, alignY=AlignTop);
